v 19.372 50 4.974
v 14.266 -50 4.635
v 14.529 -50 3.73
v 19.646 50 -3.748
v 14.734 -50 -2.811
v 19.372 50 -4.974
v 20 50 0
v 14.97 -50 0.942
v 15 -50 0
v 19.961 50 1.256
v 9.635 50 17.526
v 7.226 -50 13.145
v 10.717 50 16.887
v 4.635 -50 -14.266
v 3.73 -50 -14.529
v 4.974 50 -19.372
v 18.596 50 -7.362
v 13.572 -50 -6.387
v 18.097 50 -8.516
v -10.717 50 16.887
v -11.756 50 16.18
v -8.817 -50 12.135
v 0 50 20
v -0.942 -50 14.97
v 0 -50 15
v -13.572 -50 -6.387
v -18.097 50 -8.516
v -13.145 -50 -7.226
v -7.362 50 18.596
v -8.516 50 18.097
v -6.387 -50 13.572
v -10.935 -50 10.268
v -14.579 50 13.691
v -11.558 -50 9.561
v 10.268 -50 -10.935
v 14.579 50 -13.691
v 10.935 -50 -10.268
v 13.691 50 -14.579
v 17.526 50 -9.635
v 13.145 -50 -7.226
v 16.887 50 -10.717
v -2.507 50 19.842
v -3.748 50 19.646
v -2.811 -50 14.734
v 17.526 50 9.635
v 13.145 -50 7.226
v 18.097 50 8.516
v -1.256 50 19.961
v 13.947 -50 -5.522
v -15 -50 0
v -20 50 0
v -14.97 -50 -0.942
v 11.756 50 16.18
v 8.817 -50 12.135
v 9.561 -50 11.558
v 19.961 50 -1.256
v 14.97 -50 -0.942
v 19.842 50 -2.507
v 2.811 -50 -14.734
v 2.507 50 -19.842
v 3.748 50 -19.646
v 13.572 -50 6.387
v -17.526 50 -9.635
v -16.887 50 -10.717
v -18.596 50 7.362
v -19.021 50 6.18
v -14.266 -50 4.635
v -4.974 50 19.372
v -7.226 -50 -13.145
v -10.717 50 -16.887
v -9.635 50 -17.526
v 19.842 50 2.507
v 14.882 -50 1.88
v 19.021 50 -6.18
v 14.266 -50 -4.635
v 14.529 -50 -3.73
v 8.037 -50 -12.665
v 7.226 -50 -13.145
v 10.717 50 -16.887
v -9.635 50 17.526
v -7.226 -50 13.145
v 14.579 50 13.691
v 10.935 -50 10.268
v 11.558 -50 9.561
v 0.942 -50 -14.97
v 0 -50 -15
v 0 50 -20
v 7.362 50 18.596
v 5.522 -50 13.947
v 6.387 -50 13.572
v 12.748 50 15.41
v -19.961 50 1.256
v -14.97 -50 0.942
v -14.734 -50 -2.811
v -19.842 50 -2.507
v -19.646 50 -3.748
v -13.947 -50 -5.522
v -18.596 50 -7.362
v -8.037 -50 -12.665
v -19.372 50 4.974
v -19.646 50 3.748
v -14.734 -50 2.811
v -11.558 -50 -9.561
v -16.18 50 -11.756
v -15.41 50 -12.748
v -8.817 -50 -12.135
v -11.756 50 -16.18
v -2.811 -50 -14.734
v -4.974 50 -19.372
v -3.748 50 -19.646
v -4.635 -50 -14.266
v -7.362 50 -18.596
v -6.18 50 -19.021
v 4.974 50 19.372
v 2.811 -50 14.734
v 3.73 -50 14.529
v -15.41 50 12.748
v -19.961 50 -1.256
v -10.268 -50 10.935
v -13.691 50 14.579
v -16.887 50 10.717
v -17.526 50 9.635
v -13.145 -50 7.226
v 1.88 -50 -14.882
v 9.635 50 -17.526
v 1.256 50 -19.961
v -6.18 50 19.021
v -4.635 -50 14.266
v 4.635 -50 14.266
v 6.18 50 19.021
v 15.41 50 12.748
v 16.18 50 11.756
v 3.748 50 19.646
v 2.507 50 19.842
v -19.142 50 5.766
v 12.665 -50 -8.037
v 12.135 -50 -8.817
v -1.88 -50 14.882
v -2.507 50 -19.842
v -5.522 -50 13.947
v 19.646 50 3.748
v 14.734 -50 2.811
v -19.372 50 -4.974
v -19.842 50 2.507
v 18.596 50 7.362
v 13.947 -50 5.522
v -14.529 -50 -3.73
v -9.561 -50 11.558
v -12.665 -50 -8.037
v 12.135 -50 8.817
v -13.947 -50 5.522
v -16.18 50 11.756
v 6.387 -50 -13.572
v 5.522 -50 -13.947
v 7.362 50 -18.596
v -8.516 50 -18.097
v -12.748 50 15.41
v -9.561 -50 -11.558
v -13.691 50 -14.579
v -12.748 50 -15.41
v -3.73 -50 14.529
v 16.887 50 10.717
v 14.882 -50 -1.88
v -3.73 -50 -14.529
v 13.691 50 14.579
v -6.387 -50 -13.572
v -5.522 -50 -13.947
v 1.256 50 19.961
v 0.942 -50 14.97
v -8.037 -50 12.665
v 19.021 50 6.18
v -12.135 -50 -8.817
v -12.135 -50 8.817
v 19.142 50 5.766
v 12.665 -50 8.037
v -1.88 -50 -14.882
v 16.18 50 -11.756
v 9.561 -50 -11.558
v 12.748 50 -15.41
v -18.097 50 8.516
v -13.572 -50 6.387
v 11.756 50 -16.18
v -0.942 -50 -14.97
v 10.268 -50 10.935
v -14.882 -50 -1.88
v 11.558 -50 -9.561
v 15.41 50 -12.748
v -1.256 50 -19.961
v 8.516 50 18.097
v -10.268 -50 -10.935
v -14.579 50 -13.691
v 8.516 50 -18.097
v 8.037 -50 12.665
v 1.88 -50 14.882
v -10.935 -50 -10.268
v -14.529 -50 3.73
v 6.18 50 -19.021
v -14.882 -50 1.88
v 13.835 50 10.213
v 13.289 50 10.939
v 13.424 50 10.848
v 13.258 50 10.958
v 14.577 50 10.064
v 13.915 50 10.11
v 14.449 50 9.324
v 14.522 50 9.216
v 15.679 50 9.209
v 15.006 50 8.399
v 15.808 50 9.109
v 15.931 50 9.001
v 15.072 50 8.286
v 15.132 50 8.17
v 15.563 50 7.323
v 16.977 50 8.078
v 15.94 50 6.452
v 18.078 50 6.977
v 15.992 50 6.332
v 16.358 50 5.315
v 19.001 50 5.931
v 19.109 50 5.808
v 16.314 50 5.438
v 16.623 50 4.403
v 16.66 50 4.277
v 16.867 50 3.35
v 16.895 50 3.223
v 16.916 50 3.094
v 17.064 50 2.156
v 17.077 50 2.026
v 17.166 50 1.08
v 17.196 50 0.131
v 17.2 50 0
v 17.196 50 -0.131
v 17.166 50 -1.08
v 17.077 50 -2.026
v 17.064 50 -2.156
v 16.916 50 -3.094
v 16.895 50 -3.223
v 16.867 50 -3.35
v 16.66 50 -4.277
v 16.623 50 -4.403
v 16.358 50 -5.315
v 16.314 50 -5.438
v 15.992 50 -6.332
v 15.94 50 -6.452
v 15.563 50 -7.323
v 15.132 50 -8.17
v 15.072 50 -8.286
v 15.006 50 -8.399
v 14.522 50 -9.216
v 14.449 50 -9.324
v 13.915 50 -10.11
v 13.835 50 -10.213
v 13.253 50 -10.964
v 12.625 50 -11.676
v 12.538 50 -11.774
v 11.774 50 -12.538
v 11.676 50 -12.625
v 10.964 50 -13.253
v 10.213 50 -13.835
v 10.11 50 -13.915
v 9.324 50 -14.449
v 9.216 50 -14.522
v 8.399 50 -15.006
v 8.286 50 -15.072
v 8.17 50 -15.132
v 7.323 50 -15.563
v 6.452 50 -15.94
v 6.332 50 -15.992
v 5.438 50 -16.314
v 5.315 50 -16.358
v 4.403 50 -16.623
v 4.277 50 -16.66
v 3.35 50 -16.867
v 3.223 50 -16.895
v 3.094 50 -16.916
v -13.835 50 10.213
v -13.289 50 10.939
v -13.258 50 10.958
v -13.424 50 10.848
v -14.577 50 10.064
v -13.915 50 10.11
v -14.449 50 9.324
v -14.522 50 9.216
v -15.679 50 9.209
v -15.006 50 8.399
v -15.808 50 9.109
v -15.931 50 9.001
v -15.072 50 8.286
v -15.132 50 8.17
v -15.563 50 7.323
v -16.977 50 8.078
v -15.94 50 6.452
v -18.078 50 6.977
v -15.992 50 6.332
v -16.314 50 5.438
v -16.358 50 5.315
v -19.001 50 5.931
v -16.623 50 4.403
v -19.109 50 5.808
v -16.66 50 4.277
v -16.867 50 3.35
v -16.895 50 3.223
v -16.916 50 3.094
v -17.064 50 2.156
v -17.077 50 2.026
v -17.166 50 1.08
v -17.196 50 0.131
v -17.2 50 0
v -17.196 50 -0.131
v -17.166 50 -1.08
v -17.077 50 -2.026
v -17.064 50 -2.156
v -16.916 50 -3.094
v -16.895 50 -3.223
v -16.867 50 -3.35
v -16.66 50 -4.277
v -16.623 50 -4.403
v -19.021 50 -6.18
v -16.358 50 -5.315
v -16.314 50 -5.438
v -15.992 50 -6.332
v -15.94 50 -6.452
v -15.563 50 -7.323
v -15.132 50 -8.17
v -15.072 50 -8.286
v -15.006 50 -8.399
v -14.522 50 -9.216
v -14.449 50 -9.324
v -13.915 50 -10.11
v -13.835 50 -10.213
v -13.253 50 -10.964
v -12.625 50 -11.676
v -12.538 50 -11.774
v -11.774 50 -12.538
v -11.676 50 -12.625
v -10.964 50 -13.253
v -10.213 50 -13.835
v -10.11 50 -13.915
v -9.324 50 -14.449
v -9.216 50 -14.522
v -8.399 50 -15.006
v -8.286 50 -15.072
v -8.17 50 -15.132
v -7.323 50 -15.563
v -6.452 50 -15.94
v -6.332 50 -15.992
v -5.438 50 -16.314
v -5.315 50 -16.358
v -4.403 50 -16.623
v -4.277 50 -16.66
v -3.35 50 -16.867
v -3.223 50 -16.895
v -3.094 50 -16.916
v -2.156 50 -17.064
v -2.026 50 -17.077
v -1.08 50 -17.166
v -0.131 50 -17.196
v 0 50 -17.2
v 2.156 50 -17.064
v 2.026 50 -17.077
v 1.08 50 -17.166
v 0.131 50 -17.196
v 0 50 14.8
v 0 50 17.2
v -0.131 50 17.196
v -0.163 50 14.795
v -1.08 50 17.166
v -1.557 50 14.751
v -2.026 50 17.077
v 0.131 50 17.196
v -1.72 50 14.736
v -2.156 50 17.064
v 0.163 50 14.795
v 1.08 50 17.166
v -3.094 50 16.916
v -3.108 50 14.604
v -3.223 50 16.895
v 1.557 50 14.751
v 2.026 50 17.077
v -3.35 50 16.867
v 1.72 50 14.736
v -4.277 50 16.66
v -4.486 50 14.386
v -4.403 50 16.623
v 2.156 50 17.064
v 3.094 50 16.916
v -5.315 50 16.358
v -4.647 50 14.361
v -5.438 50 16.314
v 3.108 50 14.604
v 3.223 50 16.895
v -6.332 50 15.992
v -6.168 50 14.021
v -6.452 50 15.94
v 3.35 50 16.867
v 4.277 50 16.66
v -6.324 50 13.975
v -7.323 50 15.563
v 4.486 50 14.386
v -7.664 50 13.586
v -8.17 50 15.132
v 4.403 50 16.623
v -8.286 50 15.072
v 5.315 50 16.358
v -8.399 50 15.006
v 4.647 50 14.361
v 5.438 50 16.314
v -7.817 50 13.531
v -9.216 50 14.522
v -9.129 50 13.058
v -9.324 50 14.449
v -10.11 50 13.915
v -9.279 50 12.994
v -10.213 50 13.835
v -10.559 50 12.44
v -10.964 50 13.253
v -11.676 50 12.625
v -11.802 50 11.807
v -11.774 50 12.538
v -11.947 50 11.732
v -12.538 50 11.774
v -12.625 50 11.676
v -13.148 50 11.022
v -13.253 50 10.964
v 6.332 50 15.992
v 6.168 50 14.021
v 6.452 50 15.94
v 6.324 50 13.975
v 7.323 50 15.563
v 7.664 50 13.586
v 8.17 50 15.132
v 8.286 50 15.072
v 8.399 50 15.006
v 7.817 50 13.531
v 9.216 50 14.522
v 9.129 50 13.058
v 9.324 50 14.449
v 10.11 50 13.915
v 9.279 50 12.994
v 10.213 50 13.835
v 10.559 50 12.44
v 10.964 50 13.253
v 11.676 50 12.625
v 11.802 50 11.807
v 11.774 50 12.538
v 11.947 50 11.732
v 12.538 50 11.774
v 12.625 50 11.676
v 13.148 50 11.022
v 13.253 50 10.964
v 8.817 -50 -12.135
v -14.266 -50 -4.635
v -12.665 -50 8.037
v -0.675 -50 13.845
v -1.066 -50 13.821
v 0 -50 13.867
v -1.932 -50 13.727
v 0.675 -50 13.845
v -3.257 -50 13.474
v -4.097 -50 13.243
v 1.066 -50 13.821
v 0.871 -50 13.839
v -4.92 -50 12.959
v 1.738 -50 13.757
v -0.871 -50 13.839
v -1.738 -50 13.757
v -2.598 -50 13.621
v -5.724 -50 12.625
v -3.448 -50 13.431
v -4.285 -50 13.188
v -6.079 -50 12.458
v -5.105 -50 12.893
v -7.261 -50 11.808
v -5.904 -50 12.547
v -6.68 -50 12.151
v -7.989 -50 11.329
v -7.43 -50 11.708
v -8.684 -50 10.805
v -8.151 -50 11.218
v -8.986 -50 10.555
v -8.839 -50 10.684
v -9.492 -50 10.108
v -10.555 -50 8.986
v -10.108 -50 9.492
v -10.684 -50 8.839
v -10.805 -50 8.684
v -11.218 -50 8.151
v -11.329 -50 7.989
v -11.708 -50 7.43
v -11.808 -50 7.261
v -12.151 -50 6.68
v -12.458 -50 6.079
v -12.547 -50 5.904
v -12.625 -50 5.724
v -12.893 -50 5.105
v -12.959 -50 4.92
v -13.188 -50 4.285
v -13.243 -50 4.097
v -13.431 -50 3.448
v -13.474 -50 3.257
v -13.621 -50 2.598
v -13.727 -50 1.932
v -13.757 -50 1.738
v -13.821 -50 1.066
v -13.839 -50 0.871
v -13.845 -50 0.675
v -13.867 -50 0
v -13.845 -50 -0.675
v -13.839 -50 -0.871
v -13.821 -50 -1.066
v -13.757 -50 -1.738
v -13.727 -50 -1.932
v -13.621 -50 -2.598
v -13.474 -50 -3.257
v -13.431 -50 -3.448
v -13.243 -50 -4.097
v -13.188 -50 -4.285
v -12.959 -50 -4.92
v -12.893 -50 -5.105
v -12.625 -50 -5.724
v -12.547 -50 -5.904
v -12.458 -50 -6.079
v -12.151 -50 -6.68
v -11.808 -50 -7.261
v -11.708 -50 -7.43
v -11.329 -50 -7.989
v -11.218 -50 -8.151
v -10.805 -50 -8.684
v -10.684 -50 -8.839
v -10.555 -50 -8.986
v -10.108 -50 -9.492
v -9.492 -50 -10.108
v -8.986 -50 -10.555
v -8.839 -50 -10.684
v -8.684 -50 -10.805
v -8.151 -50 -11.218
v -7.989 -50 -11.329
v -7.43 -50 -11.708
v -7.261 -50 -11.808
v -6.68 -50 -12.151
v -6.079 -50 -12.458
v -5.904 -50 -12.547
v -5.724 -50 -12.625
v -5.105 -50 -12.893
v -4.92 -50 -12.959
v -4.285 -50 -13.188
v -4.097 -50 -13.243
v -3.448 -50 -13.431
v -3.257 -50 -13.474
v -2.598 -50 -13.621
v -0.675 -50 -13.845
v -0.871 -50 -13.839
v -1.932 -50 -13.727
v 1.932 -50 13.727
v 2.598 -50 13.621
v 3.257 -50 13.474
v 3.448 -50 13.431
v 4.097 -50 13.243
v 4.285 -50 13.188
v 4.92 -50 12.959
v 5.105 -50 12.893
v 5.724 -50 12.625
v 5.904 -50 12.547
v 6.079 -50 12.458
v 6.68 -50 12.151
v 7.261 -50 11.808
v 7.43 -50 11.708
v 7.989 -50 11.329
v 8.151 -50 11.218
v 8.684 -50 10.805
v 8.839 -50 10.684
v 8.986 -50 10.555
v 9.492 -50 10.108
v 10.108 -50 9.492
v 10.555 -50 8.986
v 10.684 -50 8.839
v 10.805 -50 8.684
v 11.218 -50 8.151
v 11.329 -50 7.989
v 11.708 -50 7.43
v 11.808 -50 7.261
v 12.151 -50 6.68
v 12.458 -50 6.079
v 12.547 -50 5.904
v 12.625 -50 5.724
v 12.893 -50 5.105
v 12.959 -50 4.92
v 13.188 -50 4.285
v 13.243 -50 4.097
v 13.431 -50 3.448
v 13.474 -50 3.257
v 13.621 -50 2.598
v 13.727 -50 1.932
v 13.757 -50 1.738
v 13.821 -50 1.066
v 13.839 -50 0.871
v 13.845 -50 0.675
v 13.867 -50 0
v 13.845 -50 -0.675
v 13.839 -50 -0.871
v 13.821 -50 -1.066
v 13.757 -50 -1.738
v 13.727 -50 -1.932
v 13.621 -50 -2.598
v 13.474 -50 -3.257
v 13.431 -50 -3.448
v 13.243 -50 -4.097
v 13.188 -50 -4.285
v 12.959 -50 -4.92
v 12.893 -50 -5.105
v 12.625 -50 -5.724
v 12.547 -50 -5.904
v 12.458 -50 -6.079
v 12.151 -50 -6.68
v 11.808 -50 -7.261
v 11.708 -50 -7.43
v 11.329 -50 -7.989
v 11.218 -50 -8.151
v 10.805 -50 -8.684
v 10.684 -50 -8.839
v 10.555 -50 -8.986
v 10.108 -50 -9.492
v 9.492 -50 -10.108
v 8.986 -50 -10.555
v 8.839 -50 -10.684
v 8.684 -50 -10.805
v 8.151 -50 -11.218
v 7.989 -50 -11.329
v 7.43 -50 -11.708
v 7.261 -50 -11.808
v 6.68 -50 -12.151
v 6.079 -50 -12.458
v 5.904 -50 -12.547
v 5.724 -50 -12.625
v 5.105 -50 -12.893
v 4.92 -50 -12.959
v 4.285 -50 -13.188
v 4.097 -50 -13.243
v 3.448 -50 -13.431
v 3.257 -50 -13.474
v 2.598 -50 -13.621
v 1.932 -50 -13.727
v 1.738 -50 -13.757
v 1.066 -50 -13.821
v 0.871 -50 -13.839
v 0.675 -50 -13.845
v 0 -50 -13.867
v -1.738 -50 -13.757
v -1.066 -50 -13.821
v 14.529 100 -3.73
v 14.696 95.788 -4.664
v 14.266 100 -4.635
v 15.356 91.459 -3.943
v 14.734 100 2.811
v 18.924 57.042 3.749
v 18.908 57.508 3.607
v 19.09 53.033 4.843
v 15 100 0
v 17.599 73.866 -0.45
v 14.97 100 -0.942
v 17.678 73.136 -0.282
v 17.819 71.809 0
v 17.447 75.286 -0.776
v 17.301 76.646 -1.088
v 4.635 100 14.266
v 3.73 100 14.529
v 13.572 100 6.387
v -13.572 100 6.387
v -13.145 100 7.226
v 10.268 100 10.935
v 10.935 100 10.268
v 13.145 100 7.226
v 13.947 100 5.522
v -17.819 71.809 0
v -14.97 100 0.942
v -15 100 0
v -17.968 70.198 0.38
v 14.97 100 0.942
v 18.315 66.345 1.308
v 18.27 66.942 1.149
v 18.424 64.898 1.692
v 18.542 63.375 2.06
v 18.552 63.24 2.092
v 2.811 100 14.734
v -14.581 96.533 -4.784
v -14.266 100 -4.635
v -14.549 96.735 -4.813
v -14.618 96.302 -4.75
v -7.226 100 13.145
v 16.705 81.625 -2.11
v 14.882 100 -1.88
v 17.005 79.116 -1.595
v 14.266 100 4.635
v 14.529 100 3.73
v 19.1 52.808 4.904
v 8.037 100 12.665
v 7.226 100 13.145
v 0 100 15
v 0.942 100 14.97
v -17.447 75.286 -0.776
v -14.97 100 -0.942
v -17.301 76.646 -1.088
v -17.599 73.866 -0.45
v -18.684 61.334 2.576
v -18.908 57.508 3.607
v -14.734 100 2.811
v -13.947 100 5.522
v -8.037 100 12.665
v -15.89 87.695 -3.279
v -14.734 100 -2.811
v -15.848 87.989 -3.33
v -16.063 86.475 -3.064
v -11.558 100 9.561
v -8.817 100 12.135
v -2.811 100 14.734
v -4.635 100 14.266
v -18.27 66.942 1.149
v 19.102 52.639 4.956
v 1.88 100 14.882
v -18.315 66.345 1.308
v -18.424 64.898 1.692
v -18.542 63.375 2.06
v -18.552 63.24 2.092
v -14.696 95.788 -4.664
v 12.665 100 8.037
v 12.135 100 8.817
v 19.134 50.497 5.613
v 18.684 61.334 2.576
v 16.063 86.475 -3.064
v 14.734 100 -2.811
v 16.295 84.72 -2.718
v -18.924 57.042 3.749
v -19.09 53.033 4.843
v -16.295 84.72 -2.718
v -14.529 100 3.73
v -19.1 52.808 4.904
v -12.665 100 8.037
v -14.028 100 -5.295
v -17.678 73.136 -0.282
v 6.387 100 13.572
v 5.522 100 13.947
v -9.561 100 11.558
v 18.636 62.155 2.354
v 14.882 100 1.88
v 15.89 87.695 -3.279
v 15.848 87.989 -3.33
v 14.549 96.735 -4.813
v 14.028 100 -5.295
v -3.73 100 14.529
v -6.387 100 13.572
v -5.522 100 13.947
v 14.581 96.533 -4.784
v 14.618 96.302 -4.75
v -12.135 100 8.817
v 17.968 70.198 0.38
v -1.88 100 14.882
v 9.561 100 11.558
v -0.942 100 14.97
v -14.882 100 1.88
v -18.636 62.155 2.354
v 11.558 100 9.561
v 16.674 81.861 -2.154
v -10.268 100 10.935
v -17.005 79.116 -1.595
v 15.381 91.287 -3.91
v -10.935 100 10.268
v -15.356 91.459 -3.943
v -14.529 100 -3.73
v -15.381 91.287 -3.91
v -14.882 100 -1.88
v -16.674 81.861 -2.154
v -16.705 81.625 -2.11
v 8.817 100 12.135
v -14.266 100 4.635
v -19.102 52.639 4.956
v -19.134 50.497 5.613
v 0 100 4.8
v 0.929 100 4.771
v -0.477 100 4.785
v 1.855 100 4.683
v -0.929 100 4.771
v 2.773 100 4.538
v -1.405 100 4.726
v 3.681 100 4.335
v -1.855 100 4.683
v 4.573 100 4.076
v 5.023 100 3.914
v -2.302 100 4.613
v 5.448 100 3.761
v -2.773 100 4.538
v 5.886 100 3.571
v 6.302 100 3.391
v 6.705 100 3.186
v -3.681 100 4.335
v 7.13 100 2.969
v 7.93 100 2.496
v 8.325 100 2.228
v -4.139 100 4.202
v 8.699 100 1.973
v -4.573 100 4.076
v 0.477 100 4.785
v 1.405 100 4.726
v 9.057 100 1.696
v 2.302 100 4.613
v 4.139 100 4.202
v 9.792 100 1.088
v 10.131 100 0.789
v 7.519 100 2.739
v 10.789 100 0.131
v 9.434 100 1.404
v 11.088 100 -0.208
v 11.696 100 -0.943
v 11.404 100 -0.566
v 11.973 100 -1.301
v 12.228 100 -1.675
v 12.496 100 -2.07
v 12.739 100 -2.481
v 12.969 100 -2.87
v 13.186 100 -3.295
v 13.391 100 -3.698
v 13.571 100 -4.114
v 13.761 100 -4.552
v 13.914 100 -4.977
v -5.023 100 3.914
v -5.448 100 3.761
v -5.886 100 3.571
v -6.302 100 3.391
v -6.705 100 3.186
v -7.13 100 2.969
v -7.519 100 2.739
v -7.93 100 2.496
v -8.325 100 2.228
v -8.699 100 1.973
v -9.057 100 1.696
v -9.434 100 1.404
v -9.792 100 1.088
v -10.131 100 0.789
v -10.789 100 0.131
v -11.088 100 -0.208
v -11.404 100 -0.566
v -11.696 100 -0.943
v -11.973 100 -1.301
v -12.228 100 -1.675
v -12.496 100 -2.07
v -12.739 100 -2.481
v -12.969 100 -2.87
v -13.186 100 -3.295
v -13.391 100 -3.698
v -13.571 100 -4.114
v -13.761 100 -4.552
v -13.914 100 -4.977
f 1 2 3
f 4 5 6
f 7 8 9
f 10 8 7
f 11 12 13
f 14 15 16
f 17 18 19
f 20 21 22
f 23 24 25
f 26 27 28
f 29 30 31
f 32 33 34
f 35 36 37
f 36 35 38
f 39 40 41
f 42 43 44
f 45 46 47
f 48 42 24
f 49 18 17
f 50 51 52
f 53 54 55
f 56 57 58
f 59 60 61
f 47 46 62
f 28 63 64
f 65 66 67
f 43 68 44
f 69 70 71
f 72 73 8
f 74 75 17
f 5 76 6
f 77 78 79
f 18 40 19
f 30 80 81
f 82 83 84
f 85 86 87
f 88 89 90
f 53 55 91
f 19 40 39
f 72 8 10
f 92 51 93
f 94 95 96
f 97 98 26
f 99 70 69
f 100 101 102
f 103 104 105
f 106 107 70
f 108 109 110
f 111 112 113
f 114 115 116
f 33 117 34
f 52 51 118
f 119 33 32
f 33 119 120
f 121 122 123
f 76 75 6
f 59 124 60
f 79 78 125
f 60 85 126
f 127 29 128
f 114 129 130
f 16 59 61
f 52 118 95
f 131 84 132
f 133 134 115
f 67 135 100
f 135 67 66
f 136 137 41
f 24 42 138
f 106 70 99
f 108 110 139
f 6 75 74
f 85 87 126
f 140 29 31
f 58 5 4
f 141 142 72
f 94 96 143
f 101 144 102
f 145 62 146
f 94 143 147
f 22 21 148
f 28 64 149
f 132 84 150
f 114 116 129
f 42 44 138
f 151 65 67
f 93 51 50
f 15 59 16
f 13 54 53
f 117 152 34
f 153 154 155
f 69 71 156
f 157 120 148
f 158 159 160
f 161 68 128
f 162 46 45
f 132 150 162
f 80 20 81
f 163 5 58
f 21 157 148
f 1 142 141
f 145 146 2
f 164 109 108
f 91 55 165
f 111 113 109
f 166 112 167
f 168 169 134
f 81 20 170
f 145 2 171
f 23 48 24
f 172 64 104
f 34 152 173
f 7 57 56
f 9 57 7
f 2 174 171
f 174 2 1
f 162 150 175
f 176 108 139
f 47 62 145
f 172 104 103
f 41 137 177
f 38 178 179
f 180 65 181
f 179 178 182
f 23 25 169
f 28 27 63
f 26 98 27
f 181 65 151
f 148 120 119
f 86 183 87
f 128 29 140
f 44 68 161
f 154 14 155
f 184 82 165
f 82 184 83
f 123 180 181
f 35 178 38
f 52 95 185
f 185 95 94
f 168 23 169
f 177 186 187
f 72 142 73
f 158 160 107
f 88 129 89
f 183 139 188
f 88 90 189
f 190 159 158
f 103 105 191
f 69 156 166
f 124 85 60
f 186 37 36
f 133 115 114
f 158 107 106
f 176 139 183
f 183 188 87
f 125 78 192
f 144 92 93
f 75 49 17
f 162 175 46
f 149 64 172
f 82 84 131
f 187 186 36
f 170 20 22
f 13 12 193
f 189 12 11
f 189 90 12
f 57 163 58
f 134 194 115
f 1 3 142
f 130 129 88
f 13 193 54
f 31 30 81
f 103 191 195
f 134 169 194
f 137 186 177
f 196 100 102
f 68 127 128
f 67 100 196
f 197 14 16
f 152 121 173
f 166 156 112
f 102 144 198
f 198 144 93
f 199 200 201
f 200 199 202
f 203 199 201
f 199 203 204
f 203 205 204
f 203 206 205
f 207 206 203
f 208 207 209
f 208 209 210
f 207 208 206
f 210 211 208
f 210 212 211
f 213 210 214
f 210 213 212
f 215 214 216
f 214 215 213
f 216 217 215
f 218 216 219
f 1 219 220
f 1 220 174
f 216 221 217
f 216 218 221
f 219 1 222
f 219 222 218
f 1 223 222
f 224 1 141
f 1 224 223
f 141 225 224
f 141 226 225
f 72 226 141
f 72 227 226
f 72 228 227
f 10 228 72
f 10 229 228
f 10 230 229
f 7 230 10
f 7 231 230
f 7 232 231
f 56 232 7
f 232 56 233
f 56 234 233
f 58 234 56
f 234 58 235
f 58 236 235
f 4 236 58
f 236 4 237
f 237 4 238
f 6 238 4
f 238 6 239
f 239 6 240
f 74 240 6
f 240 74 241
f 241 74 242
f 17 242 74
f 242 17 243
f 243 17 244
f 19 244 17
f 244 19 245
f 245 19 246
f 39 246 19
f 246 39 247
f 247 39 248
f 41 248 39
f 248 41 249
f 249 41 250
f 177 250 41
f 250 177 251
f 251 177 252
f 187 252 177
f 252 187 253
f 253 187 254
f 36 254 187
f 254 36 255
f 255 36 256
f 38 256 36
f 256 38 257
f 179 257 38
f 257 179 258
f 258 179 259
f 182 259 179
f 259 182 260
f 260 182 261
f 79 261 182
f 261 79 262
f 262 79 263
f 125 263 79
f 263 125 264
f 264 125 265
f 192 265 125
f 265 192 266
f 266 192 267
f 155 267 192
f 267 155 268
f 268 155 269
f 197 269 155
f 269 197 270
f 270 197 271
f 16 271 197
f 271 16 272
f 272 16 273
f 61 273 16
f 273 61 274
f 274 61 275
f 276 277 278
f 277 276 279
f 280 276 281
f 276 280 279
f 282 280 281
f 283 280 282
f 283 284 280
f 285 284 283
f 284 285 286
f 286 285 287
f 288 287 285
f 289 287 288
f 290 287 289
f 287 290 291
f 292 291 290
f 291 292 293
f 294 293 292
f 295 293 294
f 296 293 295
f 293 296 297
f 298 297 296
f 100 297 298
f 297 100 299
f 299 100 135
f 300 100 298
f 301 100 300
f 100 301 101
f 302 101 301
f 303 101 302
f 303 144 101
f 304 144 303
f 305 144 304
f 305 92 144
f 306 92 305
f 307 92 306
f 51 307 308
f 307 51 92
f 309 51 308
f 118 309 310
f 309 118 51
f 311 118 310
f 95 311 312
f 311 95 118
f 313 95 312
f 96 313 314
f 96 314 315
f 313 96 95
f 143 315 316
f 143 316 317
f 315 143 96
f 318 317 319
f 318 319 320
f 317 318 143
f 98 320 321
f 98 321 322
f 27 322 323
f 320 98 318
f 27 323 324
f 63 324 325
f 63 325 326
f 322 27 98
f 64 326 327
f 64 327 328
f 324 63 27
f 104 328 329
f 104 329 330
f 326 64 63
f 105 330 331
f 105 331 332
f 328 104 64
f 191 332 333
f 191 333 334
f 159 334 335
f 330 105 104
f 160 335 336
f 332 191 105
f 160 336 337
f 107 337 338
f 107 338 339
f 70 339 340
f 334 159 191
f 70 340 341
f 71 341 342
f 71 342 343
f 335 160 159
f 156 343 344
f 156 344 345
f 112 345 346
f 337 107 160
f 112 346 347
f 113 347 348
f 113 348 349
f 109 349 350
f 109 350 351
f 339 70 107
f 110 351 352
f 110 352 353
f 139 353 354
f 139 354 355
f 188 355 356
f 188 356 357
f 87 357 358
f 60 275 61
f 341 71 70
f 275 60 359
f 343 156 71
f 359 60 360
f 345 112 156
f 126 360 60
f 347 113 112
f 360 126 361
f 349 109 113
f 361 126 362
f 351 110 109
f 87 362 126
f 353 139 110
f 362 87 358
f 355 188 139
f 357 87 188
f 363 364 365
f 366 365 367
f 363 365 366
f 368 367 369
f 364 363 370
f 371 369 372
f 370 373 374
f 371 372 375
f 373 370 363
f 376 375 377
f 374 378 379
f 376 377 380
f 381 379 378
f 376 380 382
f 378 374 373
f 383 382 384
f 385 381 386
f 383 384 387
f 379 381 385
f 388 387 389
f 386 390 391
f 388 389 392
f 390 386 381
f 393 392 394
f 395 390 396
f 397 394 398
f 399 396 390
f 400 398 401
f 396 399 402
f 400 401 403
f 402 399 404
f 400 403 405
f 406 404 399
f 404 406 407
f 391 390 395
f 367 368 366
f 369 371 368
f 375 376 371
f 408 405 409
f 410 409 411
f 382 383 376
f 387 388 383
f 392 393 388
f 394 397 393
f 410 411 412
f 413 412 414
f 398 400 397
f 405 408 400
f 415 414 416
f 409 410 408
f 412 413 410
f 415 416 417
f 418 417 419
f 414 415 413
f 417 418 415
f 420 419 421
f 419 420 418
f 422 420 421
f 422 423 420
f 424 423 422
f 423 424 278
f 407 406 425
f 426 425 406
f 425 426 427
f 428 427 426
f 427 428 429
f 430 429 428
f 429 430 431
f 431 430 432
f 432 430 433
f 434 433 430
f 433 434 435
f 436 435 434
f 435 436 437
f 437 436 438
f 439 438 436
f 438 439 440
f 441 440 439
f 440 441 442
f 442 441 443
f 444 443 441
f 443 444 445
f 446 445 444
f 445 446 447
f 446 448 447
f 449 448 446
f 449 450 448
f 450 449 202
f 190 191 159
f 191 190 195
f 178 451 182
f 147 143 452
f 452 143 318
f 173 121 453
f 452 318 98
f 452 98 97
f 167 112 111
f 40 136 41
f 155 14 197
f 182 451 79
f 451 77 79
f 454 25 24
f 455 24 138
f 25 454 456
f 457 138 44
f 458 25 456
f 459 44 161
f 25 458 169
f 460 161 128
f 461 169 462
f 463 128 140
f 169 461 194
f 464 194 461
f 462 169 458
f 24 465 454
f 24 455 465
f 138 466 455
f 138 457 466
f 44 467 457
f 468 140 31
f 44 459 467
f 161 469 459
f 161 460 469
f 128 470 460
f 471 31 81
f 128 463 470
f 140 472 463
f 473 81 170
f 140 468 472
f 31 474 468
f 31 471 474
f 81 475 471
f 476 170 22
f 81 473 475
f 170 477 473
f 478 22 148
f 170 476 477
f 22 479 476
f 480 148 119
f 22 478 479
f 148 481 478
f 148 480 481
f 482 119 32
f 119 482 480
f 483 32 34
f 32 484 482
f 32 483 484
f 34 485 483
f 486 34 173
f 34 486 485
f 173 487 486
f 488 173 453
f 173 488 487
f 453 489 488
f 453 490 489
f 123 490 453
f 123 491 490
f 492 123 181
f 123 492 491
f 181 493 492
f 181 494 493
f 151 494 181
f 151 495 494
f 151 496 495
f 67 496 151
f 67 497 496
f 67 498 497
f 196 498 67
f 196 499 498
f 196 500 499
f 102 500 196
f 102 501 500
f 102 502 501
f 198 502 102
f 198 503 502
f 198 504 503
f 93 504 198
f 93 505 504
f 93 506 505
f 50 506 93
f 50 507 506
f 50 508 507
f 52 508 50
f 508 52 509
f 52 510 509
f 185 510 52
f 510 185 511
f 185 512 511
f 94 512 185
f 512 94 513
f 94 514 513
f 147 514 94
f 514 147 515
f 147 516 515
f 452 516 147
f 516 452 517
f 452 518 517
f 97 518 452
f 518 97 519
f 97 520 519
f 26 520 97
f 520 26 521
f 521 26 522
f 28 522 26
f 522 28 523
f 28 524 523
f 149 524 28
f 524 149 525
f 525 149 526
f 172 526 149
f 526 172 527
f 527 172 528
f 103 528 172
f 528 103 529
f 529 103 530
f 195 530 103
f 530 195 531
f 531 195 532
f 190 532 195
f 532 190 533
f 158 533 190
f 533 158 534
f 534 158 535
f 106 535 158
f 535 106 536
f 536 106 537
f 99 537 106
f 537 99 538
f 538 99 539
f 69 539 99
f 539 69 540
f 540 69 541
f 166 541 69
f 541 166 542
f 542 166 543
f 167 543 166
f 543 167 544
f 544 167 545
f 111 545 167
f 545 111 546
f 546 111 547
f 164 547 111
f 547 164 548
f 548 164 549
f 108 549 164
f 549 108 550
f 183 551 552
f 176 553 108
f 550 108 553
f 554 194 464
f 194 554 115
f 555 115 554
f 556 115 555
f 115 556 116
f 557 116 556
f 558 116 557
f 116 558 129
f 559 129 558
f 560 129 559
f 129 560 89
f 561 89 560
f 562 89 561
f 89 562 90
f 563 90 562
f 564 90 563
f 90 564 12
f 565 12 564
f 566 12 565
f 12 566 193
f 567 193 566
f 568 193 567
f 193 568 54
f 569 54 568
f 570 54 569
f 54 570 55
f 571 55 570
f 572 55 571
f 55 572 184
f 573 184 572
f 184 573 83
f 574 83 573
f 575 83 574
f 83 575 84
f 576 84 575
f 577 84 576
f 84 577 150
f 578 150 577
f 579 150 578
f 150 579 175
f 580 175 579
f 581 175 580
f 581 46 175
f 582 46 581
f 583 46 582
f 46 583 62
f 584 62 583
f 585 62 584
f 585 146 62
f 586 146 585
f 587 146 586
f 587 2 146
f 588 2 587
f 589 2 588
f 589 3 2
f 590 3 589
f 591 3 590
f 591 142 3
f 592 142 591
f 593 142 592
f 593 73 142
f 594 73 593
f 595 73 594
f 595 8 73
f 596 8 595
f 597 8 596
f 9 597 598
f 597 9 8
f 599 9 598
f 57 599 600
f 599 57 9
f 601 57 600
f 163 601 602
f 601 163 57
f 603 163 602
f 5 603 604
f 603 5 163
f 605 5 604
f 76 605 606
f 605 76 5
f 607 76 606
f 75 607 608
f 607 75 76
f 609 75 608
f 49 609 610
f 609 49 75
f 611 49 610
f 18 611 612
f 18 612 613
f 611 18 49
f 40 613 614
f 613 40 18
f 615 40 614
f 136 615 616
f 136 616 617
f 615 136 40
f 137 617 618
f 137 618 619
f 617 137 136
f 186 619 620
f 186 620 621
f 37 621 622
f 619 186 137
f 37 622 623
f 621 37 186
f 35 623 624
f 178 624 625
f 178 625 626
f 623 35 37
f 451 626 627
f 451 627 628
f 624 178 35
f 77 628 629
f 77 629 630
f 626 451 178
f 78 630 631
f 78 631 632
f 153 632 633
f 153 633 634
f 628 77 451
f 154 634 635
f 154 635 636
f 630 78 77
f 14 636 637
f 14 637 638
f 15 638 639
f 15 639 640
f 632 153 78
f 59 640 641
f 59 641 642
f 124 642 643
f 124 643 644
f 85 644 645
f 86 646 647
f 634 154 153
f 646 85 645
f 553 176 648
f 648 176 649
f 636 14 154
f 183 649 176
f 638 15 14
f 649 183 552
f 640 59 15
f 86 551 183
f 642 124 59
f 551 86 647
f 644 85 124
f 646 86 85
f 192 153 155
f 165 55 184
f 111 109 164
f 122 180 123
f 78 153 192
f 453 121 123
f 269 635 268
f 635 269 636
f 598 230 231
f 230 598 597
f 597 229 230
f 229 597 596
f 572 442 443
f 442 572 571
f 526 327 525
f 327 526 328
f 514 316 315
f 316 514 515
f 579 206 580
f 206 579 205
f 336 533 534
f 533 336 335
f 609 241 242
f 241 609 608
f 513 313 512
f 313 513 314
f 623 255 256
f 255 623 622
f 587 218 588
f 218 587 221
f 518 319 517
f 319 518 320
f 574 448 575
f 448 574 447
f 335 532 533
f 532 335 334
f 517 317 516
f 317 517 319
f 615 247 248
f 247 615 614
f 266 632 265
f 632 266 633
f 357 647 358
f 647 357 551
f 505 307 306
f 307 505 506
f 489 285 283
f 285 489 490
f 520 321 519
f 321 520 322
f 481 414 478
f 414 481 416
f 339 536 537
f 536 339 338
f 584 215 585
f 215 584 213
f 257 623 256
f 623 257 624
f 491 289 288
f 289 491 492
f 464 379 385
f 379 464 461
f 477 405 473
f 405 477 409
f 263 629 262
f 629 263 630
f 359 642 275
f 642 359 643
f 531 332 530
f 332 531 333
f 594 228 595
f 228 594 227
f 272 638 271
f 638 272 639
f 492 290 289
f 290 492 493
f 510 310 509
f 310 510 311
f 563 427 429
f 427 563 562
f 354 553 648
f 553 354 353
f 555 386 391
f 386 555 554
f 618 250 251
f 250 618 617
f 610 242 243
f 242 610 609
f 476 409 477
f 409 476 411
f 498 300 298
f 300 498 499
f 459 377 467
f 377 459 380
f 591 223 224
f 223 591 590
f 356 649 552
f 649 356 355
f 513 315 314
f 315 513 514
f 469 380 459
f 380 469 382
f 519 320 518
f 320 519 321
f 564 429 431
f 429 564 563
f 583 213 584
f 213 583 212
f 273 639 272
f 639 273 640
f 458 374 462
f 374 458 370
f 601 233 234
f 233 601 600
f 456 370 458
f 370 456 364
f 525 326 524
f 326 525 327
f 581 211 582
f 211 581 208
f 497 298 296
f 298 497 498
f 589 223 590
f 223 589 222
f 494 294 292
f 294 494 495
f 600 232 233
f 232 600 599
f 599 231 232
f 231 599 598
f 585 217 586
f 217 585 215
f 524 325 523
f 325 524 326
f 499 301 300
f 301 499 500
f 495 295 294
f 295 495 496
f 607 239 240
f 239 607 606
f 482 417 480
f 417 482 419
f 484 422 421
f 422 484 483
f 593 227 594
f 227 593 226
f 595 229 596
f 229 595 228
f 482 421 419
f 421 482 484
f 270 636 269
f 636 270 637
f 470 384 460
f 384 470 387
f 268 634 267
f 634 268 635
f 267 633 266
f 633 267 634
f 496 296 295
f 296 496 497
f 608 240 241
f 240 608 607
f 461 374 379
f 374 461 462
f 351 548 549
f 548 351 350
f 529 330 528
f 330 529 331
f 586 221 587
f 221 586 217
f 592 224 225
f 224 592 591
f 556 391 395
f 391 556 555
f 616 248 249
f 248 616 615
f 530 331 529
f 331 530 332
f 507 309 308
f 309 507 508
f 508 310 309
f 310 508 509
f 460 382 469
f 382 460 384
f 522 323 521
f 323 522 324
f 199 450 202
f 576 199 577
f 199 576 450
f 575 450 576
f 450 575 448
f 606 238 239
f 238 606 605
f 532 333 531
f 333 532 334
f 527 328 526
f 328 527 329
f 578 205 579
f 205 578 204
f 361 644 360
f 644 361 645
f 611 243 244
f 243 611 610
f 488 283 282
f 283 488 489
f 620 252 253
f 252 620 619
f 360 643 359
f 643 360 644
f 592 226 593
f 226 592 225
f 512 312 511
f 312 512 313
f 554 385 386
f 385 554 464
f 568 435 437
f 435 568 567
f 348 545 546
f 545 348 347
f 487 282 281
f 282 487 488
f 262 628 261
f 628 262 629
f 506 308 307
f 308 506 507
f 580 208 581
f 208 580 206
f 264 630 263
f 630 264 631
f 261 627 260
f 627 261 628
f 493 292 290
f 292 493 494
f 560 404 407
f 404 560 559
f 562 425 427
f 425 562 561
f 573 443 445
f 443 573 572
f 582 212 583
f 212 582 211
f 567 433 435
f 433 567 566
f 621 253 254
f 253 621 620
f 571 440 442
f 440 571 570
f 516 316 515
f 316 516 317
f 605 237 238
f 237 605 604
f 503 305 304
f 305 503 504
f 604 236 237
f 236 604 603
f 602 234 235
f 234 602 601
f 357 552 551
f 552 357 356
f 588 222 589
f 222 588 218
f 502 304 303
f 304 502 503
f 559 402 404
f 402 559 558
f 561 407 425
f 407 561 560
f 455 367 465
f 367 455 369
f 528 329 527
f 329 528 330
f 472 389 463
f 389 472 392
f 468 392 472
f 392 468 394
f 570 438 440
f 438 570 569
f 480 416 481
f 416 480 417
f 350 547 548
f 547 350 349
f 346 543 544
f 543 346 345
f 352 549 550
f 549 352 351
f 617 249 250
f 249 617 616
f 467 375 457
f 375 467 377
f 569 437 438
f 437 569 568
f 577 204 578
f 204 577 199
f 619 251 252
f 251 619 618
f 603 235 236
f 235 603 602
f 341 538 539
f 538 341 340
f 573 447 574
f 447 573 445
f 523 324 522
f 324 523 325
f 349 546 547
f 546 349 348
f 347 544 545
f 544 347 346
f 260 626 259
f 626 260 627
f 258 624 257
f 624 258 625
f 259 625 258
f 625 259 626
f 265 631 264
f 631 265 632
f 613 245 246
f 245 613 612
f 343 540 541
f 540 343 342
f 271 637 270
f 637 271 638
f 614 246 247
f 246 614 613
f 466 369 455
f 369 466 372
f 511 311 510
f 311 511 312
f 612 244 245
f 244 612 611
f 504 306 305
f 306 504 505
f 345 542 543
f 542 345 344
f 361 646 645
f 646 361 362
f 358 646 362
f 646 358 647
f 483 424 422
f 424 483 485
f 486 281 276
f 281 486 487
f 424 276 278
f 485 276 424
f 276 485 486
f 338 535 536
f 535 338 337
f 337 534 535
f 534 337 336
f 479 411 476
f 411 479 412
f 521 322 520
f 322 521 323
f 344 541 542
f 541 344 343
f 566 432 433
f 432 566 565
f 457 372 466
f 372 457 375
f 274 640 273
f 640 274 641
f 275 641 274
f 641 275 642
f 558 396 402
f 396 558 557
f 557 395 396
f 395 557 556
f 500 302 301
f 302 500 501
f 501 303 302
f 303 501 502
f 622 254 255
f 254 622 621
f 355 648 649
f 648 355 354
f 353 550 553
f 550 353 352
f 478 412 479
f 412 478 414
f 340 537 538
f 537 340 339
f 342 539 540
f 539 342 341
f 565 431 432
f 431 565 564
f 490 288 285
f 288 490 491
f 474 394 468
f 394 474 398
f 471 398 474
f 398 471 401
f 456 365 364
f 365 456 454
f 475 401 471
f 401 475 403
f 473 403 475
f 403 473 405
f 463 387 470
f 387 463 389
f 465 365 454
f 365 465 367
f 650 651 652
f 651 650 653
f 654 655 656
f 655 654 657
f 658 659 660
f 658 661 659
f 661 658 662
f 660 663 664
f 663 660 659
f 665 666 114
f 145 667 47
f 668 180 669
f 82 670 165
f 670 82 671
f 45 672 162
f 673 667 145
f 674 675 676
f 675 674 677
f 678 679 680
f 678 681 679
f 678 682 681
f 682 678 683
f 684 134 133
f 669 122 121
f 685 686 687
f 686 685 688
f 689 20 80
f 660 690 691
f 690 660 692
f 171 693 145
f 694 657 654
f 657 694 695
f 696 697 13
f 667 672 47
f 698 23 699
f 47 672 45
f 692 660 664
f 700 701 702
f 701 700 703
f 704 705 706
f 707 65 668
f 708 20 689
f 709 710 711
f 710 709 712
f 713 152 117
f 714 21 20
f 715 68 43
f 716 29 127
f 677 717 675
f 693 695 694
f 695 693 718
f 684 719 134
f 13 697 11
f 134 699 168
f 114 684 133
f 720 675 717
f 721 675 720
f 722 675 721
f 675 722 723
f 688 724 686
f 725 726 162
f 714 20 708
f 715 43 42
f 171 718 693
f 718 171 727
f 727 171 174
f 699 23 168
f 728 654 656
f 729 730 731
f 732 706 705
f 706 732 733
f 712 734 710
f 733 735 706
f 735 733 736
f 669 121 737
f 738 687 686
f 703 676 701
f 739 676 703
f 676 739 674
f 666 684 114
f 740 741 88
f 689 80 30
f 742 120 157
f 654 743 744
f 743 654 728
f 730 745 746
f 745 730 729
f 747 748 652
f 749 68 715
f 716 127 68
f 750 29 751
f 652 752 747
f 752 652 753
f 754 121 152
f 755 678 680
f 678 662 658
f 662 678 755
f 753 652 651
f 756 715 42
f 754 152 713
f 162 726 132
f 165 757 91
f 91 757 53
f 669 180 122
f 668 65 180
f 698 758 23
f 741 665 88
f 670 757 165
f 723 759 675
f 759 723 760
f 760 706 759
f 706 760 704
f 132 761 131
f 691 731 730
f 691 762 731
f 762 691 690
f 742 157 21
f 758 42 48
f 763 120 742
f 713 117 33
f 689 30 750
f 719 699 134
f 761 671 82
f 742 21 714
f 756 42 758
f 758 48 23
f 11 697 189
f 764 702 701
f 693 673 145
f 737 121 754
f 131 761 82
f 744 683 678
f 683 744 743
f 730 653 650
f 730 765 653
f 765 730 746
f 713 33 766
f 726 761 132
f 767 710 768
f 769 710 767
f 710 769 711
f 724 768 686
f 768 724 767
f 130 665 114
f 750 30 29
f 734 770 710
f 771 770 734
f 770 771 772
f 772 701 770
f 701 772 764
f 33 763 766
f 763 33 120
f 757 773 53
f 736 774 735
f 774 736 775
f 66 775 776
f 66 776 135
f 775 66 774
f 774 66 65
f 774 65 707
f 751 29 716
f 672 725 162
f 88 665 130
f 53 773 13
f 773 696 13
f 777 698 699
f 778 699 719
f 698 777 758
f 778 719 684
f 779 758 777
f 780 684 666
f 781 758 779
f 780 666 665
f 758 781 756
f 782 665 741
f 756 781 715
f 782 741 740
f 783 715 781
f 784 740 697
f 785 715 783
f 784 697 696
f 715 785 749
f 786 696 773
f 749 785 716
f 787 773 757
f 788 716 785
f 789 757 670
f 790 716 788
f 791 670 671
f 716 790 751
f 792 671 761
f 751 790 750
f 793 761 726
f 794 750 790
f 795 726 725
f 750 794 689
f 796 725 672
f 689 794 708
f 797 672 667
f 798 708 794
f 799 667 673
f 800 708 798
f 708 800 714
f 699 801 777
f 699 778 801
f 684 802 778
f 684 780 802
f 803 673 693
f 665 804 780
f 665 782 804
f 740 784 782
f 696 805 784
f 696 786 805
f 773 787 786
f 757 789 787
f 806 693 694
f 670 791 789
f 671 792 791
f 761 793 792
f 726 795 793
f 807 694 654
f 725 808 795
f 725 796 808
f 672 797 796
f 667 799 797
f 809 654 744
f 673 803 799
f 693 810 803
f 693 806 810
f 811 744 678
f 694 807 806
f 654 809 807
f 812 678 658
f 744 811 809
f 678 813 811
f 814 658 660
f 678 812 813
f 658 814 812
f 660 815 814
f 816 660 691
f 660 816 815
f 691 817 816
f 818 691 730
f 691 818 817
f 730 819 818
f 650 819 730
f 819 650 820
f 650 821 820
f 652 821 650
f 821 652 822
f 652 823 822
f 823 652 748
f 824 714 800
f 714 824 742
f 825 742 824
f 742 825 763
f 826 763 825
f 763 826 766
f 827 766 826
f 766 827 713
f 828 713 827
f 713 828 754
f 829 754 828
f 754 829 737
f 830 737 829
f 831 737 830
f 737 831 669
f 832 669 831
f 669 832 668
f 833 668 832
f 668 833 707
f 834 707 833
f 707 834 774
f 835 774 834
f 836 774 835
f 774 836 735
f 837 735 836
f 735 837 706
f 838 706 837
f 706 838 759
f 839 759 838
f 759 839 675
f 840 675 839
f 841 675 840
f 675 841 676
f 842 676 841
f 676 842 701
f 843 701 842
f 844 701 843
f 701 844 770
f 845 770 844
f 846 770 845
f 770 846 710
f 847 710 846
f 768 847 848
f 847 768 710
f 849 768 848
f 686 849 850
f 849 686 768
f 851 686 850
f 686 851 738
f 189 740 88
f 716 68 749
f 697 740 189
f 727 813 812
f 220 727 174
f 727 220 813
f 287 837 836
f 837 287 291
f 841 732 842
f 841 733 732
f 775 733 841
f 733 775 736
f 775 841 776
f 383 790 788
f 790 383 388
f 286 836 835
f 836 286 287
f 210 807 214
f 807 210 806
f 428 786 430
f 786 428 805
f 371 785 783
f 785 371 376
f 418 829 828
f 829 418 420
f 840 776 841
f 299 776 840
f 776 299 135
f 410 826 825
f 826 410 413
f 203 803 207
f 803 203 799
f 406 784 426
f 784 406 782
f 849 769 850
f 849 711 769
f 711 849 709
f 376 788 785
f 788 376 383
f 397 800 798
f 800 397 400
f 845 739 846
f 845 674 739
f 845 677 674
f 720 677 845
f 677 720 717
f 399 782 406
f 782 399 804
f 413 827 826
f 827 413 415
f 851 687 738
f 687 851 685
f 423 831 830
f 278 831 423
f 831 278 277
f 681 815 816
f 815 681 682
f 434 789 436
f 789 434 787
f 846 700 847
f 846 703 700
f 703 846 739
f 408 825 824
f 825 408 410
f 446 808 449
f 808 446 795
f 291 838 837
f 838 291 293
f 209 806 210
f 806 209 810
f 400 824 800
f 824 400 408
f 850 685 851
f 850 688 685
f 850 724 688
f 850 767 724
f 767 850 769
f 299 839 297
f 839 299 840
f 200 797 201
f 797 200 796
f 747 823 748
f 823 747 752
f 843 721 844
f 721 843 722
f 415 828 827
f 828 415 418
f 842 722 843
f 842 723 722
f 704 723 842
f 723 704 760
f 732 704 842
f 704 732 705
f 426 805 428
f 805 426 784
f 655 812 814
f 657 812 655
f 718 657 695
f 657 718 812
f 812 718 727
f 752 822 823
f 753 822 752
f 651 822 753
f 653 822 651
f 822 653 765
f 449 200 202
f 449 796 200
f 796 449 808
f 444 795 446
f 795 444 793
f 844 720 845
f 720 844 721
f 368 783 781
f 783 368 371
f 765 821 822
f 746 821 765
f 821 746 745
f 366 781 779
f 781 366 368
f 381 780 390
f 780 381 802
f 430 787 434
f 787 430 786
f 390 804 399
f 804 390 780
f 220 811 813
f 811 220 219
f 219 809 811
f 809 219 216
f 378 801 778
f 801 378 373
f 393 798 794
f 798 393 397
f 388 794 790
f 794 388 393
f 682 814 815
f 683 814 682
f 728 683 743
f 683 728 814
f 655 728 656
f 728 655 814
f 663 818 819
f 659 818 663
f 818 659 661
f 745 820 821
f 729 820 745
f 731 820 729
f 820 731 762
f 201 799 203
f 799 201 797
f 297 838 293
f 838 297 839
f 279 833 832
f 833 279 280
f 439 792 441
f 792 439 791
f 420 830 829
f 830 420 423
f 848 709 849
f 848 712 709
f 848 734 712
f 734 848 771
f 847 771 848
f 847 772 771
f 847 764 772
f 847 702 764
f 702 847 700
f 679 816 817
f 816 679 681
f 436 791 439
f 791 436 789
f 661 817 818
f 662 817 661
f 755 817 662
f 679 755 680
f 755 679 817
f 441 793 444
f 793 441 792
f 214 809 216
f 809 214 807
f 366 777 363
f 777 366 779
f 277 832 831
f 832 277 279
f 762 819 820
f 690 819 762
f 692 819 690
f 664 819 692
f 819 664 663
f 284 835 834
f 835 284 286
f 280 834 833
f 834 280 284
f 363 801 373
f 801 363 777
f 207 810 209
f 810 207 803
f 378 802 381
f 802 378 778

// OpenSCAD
difference()
{

rotate([90,0,0])
color([.3,1,.5])
cylinder(100,20,15,center=true,$fn=100);
    
rotate([90,0,0])
translate([0,0,1])
color([.3,1,1])
cylinder(150,18,13,center=true,$fn=100);

}

translate([0,75,0])
difference()
{

rotate([270,0,0])
color([.3,1,.5])
cylinder(50,20,15,center=true,$fn=100);
    
rotate([90,0,0])
translate([0,-10,1])
color([.3,1,1])
cylinder(100,10,30,center=true,$fn=100);

}
